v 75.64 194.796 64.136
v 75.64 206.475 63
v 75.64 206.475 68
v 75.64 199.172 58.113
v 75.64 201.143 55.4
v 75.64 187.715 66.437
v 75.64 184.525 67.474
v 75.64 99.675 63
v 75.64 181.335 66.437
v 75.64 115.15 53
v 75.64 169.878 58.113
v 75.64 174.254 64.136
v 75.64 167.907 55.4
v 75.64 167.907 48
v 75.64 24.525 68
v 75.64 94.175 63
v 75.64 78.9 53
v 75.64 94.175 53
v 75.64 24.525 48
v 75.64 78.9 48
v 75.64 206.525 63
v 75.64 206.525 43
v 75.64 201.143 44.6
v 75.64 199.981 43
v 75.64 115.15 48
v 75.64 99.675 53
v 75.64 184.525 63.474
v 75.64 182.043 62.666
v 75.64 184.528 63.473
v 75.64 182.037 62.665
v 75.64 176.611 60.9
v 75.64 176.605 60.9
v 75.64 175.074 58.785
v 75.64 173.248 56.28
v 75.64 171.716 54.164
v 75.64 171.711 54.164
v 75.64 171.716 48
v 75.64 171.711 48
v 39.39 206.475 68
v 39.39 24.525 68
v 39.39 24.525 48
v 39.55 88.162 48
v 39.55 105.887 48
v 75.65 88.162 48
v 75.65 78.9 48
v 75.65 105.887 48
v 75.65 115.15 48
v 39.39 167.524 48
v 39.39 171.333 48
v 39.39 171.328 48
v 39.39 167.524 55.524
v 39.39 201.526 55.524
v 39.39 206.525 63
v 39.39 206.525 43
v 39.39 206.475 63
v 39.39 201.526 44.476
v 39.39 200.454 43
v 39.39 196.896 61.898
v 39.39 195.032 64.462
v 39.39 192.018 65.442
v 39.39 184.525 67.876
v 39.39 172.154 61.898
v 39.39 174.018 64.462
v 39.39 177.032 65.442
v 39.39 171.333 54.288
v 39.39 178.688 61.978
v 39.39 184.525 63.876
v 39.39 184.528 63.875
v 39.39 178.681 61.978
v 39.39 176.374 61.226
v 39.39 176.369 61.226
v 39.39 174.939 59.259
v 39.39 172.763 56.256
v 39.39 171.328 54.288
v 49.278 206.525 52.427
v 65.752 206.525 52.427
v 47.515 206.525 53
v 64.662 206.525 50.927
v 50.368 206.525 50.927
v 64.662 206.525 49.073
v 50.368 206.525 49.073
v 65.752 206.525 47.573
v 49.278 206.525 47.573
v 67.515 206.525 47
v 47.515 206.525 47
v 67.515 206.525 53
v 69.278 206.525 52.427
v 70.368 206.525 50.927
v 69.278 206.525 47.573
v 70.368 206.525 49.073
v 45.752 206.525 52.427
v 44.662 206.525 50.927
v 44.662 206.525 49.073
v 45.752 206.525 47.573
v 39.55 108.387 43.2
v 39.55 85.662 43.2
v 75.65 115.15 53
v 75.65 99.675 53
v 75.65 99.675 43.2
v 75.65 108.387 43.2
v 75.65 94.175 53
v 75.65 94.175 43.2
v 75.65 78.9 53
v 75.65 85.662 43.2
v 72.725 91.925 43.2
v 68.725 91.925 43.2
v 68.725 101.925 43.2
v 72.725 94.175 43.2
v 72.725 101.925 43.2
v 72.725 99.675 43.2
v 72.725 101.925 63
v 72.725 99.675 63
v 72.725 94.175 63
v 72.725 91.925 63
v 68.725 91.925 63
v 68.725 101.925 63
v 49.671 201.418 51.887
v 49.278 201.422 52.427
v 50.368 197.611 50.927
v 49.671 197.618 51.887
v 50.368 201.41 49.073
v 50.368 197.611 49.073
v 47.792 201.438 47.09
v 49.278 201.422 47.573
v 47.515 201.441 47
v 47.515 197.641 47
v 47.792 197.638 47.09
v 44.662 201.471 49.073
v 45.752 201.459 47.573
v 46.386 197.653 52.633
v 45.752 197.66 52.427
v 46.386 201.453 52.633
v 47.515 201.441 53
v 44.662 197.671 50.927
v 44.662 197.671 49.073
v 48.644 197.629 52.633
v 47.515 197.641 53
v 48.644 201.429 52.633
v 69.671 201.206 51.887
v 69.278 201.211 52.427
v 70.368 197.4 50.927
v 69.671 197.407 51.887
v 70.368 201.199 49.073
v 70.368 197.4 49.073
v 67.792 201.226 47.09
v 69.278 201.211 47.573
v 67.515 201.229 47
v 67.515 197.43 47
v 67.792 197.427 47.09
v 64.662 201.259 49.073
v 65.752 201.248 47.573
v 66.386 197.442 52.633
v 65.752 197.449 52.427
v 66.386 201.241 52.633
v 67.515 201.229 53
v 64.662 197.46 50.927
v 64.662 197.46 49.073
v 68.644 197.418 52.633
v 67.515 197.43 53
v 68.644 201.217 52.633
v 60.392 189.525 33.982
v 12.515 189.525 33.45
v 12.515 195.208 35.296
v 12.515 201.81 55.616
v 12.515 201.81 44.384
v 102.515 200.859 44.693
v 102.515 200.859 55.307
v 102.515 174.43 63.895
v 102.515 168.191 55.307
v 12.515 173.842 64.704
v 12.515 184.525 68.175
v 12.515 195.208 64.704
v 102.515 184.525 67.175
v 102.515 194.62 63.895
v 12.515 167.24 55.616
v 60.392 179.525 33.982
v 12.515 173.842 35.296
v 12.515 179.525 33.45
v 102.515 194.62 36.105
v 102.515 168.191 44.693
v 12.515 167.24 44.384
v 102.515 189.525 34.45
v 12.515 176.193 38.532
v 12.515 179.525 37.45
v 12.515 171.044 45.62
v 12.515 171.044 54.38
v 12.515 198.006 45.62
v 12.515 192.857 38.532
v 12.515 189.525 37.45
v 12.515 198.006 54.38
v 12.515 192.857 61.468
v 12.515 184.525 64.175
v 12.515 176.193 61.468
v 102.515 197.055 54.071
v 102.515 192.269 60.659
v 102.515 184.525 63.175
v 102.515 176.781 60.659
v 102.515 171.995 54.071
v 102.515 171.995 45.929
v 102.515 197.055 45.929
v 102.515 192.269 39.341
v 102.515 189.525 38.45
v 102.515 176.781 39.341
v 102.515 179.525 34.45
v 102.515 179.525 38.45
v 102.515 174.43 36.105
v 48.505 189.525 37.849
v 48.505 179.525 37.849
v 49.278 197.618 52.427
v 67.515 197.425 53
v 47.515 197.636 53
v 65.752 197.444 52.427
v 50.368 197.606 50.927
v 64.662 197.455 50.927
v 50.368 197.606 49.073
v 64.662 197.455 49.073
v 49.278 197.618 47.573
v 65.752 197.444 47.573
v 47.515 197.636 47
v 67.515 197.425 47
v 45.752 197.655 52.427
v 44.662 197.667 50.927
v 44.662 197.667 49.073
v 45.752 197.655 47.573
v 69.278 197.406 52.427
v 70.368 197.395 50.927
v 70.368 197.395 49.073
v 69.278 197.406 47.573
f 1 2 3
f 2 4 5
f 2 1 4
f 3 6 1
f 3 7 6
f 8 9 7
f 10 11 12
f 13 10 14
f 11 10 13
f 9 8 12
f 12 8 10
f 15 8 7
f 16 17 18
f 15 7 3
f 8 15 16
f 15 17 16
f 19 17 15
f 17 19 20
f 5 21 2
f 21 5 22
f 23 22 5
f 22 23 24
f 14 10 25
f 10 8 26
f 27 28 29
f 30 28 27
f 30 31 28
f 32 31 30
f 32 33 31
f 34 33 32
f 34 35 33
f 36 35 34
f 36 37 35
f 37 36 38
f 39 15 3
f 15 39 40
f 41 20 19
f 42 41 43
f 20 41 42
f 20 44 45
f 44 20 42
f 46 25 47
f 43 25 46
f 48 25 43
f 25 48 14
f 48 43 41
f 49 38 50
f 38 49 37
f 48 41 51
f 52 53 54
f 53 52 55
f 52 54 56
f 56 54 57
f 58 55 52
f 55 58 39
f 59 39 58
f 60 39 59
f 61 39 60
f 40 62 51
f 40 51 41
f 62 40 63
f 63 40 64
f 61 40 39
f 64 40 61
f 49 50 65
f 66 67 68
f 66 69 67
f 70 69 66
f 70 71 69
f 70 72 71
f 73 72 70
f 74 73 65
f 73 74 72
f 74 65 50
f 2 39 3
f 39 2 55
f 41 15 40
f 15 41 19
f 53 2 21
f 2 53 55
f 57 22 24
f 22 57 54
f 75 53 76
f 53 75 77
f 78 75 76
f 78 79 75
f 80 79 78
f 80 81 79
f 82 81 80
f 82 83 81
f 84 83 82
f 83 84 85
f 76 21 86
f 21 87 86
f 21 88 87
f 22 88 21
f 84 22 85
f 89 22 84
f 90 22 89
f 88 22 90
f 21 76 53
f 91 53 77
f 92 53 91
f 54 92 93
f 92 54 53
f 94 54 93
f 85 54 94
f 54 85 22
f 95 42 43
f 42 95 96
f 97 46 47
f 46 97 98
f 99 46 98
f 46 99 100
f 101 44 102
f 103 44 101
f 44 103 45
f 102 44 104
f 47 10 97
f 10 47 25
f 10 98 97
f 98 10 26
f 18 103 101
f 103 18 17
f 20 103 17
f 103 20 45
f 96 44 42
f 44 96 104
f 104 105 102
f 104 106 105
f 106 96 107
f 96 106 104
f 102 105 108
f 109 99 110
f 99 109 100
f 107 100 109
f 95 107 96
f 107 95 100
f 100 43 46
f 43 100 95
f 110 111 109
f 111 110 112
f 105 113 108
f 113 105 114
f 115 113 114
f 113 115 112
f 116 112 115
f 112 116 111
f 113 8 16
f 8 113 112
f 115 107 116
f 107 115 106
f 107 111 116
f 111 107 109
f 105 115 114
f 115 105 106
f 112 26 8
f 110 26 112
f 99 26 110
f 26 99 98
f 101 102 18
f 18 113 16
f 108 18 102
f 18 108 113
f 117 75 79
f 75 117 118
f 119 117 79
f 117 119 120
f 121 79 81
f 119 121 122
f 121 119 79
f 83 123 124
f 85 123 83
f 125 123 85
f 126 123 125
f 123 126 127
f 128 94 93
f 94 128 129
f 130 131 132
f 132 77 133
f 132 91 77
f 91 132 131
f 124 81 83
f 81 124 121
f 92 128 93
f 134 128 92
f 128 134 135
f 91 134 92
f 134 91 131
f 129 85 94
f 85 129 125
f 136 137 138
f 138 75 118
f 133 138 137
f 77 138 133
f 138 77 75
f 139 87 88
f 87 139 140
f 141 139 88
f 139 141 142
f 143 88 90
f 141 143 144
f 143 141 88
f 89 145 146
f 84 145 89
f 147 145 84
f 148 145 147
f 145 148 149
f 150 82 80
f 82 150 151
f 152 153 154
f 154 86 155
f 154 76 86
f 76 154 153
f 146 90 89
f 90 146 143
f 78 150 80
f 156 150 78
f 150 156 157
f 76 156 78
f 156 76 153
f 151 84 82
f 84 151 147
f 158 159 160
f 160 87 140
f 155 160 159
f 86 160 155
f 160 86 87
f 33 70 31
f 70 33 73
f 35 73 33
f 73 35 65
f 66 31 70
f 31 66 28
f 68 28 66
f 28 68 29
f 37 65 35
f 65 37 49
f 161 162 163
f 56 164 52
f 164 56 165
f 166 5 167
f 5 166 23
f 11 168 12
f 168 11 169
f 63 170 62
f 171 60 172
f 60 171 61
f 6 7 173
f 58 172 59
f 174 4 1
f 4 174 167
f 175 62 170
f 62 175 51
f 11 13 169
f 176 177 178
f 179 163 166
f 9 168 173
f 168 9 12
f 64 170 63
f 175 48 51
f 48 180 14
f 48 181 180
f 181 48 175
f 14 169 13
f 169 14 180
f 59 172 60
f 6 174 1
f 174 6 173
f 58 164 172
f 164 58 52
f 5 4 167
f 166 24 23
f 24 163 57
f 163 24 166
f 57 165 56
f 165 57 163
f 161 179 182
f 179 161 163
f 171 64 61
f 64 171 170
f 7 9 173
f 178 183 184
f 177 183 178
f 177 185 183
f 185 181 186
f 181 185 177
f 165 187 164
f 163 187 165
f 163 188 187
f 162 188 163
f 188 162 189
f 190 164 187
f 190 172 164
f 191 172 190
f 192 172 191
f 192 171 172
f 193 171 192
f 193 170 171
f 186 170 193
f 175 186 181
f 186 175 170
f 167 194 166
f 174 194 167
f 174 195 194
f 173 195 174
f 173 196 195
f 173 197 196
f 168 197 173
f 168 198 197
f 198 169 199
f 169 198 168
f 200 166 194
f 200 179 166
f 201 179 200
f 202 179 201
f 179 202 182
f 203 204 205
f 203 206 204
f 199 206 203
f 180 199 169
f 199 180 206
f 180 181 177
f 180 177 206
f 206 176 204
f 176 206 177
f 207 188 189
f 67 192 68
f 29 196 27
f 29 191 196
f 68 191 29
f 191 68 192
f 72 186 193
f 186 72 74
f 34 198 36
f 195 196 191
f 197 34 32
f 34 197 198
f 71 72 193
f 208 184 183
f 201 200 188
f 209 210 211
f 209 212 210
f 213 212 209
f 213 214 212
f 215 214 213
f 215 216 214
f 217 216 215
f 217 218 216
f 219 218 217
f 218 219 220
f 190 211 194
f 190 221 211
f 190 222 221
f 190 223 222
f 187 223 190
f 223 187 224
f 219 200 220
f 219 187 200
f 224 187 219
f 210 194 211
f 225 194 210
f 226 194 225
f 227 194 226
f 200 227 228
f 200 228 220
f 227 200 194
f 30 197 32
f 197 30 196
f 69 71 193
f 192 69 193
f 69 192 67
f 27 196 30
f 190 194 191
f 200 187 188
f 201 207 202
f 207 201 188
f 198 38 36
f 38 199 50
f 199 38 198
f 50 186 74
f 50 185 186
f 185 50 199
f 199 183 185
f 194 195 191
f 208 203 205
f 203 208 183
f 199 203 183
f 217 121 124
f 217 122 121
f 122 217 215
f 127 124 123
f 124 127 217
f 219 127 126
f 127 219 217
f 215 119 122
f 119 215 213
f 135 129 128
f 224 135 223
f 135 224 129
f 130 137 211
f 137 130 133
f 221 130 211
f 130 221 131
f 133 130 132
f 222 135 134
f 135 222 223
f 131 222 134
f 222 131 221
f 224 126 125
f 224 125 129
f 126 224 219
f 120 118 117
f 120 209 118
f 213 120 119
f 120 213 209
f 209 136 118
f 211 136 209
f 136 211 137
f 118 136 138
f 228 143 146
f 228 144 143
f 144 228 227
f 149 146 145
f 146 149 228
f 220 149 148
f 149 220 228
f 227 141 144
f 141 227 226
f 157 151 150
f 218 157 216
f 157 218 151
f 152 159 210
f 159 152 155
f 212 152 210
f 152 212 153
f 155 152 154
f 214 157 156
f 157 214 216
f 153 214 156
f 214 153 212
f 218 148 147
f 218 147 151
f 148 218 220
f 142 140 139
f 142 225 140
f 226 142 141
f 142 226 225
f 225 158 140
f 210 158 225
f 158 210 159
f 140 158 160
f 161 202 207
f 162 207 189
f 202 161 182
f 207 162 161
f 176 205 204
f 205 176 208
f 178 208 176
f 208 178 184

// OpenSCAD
//----------Suporte do Canhão de Ar Quente----------//

//-----Declaração de Variáveis-----//
r=3;
d=25;
h=9;
nx=5;
ny=5;
geo=1;
res=10;
aux=2*d+15.15;
aux2=40.7-24.2+111.70-16.7-5.15/2;
aux3=11/2;
aux4=(37.55+4)/2 - (16.35+5.1/2-13.2);
cc=25;
ff=37.5;
gg=0.2;
shift=(17.5+2*d)/2;
shift2=(17.5)/2;
h_alt=11/2;
hip=h_alt/(sin(60));
o_ext=d*0.75+2*shift; // Segundo rabo de andorinha
o_ext2=2*shift2+d*0.75; //Primeiro rabo de andorinha

//-----Declaração de Funções-----//
module funcao_2d_array_cilindros(r,d,h,nx,ny,geo,res){
    //-----FUNÇÃO ARRAY 2D DE CILÍNDROS-----//
    /*
    Forneça:
        raio dos cilíndros: r
        distância entre os centros de cada cilíndro: d
        altura dos cilíndros: h
        quantidade de cilíndros em ambas as direções: nx, ny
        resolução dos cilíndros: res
    Selecione a geometria:
         Retangular: 1
         Hexagonal: 2
    
    Quantidade de cilíndros = nx*ny
    geo=1 => Dimensões: [(nx-1)*d+2*r,(ny-1)*d+2*r,h]
    geo=2 => Dimensões: [(nx-1+cos(60))*d+2*r,(ny-1)*d*sin(60)+2*r,h]
    */
    if (d<2*r){
        text("Error!");
        translate([0,-15,0])text("Verify your specified dimensions.");
    }else{
        if(geo==1){
            for(j=[0:1:ny-1]){
                for(i=[0:1:nx-1]){
                    translate([i*d,j*d,0])cylinder(h,r,r,$fn=res);
                }
            }
        }else if(geo==2){
            for(j=[0:1:ny-1]){
                for(i=[0:1:nx-1]){
                    translate([i*d+(j%2)*d*cos(60),j*d*sin(60),0])cylinder(h,r,r,$fn=res);
                }
            }
        }else{
            text("Error!");
            translate([0,-15,0])text("Please, choose a valid geometry number.");
        }
        
    }    
}

//-----Rabo de Andorinha (Eixo X)-----//
difference(){
    translate([0,0,0]){
        //-----Suporte do Suporte Cilíndrico-----//
        translate([4*d+5+7-0.11-2*o_ext2,4*d+5.15+10-(5/2)*o_ext2,48])cube([o_ext2,5*o_ext2+0.7,20]);
        //-----Suporte Parafuso do Suporte Cilíndrico-----//
        translate([4*d+5+7-0.11-2*o_ext2,4*d+5.15+10-(5/2)*o_ext2+200-40,58-15])cube([o_ext2,22,20]);
        translate([-(aux/2-shift-(d*0.75)/2)+4-(4*d+5.15+10-o_ext)/2,4*d+5.15+10-o_ext2,0])
        translate([0,0,38])
        rotate([0,0,90])
        rotate([90,0,0]) // Muitas translações e rotações
        {   
            //-----Rabo de Andorinha Cima (Eixo X)-----//
            translate([-(15-shift2+(20-(d*0.75))/2),-30,(4*d+5.15+10-o_ext2)/2])linear_extrude(o_ext2-0.15)polygon(points=[[35+shift2-(20-(d*0.75))/2,45],[35+shift2-(20        -(d*0.75))/2,40],[27.5-gg+shift2*0.75,40],[30-gg+shift2*0.75,35+gg],[20+gg-shift2*0.75,35+gg],[22.5+gg-shift2*0.75,40],[15-shift2+(20-(d*0.75))/2,40],[15-        shift2+(20-(d*0.75))/2,45]]);
        };
    };
    #translate([4*d+5.15+10-o_ext2/2-28.3,-4.5+4*d+5-0.45+10-o_ext2/2,38+5])cube([4,10,20]);
    #translate([4*d+5.15+10-o_ext2/2+3-28.3,-4.5/2+ 4*d+5-0.45+10-o_ext2/2,38+5])cube([4,5.5,20]);
    #translate([4*d+5+7-0.11-2*o_ext2-(90-o_ext2)/2-10,4*d+5.15+10+(3/2)*o_ext2,50])
    #rotate([0,90,0])
    #translate([0,45,45])
    #rotate([90,0,0])// Muitas translações e rotações
    #cylinder(35,r,r,$fn=res);
    #translate([4*d+5+7-0.11-2*o_ext2-(90-o_ext2)/2+10,4*d+5.15+10+(3/2)*o_ext2,50])
    #rotate([0,90,0])
    #translate([0,45,45])
    #rotate([90,0,0])// Muitas translações e rotações
    #cylinder(35,r,r,$fn=res);
    #translate([12.5,200-15.47,48+2])rotate([0,90,0])cylinder(90,28.35/2,26.35/2,$fn=res);
};

//-----Suporte Cilíndrico-----//
translate([4*d+5+7-0.11-2*o_ext2-(90-o_ext2)/2,4*d+5.15+10+(3/2)*o_ext2+15,48+2])rotate([0,90,0])difference(){
    translate([0,0,0]){
        cylinder(90,28.35/2+4,26.35/2+4,$fn=res);
    }
    #cylinder(90,28.35/2,26.35/2,$fn=res);
    #translate([0,45,45-10])rotate([90,0,0])cylinder(45,r,r,$fn=res);
    #translate([0,45,45+10])rotate([90,0,0])cylinder(45,r,r,$fn=res);
    #translate([0,-5,0])cube([40,10,90]);
}
